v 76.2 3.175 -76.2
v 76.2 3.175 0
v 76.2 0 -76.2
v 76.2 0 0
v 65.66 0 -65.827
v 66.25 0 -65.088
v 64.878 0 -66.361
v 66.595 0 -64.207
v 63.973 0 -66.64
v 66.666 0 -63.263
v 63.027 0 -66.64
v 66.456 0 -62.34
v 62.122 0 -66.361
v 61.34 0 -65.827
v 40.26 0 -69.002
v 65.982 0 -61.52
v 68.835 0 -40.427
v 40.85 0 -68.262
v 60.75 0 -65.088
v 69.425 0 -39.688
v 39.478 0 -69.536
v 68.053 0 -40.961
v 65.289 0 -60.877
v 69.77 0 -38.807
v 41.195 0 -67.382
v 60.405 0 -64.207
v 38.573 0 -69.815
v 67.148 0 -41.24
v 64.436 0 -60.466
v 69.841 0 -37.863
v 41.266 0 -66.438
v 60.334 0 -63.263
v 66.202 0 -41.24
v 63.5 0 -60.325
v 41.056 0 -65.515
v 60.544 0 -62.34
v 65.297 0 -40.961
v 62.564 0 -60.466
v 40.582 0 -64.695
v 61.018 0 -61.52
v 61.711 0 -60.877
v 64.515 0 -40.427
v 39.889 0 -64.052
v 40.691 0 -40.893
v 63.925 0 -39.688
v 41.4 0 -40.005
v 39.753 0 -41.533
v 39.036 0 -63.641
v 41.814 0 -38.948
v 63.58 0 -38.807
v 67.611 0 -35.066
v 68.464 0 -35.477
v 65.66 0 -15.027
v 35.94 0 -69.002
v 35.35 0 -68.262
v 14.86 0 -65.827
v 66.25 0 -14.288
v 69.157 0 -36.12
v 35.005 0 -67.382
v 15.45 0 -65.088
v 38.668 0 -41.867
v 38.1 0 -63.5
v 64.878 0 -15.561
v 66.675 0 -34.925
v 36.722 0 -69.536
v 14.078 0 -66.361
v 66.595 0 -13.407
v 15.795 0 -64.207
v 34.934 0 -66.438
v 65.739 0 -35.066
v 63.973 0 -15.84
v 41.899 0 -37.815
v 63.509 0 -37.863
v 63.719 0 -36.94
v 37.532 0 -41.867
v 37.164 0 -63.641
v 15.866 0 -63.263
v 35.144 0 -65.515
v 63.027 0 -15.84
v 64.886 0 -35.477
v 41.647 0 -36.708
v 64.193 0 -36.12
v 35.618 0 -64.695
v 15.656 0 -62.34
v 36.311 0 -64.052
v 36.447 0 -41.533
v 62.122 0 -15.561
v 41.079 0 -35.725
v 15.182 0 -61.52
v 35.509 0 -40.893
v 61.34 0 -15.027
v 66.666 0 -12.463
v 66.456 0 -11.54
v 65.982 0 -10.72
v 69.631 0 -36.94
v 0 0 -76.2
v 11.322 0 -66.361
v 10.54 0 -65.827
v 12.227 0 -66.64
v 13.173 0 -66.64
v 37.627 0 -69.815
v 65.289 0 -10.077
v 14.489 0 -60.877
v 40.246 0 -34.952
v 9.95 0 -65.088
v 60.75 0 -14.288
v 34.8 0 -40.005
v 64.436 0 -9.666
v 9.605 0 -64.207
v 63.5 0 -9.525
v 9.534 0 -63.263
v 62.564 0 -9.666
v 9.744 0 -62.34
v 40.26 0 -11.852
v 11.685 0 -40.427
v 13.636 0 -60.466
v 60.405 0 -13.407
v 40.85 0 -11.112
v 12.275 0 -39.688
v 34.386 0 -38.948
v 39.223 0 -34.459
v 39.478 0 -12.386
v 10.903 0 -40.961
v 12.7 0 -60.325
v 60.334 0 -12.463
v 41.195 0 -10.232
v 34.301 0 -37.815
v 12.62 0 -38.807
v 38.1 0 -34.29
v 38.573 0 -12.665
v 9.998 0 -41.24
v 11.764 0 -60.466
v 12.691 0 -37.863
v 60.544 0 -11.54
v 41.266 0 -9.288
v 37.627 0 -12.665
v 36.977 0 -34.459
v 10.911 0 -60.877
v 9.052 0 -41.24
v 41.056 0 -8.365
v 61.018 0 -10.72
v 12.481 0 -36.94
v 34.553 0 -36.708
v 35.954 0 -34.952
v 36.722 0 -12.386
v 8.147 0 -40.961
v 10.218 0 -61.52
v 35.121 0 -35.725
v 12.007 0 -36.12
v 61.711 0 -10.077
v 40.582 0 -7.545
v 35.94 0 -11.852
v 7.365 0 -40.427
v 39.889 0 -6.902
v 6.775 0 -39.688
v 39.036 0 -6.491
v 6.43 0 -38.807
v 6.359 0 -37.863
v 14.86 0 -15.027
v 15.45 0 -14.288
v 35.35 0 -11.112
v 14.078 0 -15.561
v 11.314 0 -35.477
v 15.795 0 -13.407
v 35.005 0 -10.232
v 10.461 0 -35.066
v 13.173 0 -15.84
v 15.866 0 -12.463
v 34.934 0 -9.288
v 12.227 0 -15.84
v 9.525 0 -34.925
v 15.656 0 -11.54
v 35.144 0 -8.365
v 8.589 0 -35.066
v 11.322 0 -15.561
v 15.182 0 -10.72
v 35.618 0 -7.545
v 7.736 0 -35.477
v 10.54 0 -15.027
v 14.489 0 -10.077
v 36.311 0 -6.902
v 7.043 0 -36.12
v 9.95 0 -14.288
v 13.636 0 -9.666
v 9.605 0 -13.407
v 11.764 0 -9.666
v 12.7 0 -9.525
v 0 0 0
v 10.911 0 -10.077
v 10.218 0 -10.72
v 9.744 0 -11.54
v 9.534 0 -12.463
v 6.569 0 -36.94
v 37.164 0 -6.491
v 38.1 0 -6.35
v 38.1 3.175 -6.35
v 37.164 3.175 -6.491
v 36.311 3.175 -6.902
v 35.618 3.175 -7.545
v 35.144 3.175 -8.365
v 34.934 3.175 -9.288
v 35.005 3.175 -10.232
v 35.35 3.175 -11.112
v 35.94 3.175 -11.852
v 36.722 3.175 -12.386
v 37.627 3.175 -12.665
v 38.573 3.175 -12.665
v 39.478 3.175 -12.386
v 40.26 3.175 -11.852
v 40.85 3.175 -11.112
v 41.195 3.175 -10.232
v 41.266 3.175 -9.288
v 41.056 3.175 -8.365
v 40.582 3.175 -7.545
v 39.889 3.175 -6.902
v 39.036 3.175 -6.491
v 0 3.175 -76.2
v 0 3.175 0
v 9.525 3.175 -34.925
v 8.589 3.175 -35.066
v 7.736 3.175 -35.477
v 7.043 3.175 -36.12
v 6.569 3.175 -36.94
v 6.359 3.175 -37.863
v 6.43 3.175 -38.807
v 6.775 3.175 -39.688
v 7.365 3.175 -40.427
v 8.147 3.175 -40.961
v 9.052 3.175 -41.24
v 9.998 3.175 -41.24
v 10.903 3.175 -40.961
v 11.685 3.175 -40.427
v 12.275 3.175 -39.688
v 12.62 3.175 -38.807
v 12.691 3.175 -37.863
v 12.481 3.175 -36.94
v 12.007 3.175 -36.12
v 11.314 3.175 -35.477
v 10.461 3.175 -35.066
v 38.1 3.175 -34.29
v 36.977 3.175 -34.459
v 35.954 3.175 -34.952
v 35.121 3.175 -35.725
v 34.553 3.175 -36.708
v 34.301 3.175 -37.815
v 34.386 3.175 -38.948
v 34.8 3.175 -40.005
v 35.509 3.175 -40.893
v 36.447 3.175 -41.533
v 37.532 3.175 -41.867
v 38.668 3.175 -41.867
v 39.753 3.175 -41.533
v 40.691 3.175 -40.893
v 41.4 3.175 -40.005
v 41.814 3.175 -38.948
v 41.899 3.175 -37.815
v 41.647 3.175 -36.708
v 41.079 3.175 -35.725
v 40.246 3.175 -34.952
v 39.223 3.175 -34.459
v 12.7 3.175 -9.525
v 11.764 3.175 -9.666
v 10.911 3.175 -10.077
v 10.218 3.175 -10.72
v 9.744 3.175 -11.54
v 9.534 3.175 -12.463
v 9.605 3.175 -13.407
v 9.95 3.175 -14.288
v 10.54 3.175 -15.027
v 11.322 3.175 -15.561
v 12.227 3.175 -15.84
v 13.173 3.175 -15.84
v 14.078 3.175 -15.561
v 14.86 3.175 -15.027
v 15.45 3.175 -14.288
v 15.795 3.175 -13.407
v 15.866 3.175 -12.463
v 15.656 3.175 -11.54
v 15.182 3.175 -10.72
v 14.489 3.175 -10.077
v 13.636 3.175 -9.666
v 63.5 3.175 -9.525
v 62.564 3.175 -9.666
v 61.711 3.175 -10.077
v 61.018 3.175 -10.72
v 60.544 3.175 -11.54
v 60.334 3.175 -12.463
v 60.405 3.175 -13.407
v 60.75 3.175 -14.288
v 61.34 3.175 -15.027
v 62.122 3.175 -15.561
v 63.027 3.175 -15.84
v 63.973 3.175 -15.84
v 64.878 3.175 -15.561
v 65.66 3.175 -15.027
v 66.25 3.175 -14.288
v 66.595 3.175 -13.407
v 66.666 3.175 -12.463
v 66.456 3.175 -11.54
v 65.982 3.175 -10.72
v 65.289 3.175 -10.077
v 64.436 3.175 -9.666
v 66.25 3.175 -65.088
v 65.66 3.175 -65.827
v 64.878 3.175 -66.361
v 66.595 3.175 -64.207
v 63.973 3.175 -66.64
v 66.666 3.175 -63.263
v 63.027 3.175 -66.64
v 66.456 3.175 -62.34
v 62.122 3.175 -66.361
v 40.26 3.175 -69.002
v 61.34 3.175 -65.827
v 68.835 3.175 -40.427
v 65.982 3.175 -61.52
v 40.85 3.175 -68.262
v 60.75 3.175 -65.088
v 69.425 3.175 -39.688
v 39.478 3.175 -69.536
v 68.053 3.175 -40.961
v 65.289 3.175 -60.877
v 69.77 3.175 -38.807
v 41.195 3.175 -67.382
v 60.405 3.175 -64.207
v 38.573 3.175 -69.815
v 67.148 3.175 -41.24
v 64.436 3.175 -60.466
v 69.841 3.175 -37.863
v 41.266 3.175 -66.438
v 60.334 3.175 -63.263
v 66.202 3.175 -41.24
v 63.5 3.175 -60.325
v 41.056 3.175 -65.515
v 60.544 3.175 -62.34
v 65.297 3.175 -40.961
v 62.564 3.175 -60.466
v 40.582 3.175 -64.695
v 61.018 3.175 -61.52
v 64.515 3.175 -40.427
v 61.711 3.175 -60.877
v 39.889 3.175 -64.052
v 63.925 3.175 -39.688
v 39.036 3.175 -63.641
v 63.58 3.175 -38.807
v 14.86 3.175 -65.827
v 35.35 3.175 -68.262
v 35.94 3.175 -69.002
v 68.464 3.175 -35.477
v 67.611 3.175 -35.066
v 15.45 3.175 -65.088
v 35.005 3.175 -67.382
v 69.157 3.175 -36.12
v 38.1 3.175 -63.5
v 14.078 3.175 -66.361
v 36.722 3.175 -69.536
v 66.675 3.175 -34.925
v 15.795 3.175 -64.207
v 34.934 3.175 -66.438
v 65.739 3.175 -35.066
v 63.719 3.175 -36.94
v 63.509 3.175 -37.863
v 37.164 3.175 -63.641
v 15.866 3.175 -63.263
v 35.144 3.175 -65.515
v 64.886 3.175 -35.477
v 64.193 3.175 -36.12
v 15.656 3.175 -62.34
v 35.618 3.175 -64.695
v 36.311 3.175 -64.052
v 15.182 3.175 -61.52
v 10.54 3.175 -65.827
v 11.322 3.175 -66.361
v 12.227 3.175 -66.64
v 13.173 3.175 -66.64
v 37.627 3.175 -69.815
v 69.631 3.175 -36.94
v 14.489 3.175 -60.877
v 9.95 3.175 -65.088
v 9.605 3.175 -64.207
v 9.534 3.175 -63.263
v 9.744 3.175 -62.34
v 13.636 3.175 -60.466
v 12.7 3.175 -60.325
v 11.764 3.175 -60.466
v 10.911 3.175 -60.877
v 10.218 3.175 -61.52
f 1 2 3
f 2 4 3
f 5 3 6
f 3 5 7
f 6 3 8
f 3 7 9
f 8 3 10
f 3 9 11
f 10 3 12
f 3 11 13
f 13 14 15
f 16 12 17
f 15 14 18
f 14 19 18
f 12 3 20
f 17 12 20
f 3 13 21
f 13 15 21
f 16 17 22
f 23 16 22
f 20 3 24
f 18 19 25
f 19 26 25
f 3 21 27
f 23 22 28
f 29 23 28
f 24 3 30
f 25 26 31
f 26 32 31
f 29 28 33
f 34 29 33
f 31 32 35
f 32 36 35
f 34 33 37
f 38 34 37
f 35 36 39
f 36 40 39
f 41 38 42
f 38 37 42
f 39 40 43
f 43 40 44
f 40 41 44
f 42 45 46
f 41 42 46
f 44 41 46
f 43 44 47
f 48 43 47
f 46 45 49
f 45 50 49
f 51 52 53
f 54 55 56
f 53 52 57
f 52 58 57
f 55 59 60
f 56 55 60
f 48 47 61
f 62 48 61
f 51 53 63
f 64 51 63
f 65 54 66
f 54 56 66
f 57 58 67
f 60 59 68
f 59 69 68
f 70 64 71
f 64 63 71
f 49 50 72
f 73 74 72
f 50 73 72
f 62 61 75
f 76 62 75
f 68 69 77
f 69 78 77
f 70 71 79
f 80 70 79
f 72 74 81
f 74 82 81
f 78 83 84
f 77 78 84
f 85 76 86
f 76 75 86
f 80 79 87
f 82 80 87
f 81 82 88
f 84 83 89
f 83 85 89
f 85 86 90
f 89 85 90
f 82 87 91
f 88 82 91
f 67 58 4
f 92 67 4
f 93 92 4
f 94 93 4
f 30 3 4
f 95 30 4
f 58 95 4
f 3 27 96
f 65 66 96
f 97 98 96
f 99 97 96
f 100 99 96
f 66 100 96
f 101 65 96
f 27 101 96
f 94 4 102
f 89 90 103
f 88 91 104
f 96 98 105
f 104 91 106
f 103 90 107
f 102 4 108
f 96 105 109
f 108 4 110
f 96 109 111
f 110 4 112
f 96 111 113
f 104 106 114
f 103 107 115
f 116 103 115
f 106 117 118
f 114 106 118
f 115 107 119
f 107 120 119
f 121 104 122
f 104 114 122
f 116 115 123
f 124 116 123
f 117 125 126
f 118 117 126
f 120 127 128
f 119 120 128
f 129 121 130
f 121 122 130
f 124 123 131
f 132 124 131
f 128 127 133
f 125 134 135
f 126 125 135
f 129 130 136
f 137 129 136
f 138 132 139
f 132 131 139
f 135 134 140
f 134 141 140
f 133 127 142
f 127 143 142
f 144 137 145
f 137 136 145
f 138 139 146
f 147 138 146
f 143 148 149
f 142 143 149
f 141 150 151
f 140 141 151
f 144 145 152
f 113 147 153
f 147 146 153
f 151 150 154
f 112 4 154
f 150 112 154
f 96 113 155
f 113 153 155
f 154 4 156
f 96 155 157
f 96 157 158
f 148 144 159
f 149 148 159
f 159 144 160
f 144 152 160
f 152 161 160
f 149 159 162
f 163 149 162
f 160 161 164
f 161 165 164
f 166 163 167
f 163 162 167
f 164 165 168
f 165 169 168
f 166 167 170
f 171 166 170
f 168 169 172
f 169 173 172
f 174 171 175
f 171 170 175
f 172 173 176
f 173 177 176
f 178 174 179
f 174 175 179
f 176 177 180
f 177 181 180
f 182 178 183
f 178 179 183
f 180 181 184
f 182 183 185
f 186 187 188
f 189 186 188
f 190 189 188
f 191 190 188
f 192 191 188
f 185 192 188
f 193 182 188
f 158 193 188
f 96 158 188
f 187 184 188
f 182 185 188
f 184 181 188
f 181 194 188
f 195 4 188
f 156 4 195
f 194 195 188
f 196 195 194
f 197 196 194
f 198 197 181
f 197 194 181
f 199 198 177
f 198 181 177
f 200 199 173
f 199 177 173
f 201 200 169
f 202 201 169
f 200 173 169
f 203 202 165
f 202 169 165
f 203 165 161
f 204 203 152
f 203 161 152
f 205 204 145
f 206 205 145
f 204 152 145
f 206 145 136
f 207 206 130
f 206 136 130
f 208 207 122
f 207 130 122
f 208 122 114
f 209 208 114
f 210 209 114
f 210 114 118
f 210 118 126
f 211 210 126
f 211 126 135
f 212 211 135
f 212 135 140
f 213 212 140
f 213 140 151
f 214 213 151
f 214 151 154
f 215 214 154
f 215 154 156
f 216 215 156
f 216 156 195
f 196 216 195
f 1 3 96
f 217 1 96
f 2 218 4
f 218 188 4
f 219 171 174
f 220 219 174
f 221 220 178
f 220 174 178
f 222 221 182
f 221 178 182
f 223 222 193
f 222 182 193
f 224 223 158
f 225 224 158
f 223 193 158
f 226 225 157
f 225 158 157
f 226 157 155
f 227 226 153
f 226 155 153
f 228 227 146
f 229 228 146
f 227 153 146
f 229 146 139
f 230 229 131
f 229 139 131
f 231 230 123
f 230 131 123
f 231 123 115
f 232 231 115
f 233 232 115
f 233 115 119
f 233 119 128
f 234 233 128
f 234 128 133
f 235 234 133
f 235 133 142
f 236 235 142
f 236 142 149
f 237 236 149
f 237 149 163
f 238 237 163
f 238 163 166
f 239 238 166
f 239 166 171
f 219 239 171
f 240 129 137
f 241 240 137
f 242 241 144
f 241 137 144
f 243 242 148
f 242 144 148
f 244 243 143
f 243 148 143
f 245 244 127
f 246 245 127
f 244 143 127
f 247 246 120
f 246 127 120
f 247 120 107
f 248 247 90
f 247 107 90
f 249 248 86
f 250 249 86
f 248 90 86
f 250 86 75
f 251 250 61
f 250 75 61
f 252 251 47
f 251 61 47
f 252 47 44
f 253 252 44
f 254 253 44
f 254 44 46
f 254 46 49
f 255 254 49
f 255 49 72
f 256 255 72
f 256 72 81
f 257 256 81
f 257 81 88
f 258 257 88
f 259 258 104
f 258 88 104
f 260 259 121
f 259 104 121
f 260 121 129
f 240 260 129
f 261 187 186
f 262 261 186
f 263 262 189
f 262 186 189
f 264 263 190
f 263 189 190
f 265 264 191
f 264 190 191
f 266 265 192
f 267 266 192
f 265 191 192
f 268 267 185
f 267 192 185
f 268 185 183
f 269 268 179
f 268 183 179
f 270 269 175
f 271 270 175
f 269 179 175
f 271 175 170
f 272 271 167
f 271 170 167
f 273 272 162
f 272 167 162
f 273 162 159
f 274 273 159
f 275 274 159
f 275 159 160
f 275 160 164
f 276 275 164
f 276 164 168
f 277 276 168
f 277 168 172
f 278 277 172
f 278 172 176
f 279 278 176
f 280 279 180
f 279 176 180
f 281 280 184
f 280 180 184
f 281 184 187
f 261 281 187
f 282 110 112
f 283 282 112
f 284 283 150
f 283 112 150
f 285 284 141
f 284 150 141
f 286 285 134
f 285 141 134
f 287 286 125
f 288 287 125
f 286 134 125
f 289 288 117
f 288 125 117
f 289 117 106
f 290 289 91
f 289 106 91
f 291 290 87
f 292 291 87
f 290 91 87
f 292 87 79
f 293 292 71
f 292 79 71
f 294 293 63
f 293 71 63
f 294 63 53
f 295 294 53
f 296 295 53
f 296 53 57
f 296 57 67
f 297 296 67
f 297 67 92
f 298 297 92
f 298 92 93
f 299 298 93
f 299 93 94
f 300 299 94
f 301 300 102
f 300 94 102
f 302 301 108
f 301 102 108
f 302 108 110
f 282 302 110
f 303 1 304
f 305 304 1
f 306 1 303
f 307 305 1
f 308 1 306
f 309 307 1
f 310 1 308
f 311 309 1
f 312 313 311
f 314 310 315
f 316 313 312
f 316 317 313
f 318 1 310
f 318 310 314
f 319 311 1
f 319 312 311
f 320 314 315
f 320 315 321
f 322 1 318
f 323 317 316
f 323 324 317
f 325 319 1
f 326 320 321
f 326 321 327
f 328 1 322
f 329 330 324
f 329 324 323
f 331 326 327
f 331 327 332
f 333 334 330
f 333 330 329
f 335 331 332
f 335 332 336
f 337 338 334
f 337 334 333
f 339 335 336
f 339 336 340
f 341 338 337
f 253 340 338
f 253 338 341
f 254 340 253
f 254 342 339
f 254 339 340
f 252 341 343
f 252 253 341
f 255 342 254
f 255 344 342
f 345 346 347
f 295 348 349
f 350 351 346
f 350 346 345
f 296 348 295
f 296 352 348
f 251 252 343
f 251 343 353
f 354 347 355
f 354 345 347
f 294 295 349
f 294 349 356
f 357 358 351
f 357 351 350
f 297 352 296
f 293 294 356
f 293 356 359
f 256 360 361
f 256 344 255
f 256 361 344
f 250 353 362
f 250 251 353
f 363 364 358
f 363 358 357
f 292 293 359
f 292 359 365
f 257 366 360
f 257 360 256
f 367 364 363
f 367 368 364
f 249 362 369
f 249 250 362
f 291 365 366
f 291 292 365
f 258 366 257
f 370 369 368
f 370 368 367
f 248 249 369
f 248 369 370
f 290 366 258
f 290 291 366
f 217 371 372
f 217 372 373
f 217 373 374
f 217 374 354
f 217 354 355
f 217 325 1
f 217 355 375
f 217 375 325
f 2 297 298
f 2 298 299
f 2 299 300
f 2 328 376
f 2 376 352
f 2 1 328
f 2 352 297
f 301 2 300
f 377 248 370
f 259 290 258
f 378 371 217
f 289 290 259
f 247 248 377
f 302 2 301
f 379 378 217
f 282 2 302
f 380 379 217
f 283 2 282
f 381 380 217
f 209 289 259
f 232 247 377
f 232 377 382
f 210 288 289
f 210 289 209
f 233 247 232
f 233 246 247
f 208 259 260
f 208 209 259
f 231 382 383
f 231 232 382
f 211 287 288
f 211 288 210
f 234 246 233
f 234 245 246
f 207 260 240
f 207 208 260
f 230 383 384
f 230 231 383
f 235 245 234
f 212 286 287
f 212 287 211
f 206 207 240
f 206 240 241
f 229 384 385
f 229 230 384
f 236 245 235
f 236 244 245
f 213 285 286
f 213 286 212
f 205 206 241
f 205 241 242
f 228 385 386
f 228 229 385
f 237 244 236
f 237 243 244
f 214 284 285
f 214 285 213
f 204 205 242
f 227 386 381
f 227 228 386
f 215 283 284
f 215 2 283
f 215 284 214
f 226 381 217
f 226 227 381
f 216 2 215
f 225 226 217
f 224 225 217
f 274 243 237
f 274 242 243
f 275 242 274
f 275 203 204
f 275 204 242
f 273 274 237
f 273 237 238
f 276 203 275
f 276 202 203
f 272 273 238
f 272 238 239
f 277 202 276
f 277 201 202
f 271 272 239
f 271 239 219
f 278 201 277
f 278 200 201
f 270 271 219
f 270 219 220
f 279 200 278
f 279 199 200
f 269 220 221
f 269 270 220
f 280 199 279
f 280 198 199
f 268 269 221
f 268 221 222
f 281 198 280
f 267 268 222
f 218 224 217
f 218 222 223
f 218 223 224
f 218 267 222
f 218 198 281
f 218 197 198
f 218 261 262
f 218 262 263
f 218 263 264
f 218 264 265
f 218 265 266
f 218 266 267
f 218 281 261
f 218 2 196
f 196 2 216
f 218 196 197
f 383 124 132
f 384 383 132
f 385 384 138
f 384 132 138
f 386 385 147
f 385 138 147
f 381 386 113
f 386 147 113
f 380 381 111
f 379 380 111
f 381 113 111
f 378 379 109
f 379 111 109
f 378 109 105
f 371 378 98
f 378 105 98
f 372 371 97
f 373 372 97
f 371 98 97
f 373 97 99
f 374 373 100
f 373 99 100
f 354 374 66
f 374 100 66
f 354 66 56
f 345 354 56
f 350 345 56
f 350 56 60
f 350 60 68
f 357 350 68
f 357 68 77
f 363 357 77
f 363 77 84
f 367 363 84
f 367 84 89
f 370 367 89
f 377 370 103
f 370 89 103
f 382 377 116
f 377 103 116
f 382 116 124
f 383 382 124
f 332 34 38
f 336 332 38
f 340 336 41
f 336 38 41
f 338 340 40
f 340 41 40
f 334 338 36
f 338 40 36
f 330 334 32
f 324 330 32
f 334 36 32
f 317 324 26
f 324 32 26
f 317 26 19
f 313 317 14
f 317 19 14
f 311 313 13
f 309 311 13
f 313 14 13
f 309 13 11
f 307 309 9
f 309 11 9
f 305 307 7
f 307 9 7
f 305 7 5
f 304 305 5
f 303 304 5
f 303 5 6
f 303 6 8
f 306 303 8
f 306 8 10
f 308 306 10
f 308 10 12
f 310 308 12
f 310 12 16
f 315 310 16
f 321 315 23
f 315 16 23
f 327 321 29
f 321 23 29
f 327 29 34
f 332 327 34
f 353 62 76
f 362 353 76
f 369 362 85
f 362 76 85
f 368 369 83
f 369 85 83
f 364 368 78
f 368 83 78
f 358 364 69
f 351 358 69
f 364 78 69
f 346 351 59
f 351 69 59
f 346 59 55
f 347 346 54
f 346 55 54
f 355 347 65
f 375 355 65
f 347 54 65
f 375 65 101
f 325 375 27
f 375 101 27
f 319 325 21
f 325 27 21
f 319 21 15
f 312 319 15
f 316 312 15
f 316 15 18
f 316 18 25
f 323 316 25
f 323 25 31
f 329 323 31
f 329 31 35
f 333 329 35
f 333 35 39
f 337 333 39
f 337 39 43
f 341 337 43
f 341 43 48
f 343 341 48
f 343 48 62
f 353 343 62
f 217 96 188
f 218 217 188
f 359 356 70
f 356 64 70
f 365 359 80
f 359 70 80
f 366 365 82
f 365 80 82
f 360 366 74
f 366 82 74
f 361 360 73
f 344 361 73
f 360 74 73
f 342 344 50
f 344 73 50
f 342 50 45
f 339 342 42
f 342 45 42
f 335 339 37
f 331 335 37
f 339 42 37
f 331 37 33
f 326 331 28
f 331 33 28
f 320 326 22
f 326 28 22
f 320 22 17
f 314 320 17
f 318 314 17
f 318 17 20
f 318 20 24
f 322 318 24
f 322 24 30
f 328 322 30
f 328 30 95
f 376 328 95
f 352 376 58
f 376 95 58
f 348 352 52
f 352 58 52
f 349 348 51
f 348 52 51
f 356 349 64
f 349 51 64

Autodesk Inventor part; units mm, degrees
ref_plane "YZ Plane" through (0, 0, 0) normal (1, 0, 0) x (0, 1, 0)
ref_plane "XZ Plane" through (0, 0, 0) normal (0, 1, 0) x (-1, 0, 0)
ref_plane "XY Plane" through (0, 0, 0) normal (0, 0, 1) x (1, 0, 0)
sketch "Sketch1" plane through (0, 0, 0) normal (0, 1, 0) x (-1, 0, 0)
  line L0 (0, 0) -> (-76.2, 0)
  line L1 (-76.2, 0) -> (-76.2, -76.2)
  line L2 (-76.2, -76.2) -> (0, -76.2)
  line L3 (0, -76.2) -> (0, 0)
  dimension "d0" = 76.2
  dimension "d1" = 76.2
extrude "Extrusion1" add sketch "Sketch1" along normal blind 3.175
sketch "Sketch2" plane through (0, 3.175, 0) normal (0, 1, 0) x (1, 0, 0)
  line L0 (76.2, 76.2) -> (0, 76.2) projected
  line L1 (0, 76.2) -> (0, 0) projected
  line L2 (9.525, 38.1) -> (38.1, 66.675)
  line L3 (38.1, 66.675) -> (66.675, 38.1)
  line L4 (66.675, 38.1) -> (38.1, 9.525)
  line L5 (38.1, 9.525) -> (9.525, 38.1)
  line L6 (0, 0) -> (76.2, 0) projected
  dimension "d5" = 57.15
  dimension "d7" = 57.15
  dimension "d8" = 9.525
  dimension "d9" = 9.525
  dimension "d29" = 45
hole "Hole1" at (38.1, 3.175, -66.675) at (9.525, 3.175, -38.1) at (38.1, 3.175, -9.525) at (66.675, 3.175, -38.1) direction (0, -1, 0) diameter 6.35 end through all
sketch "Sketch3" plane through (0, 3.175, 0) normal (0, 1, 0) x (1, 0, 0)
  line L0 (76.2, 0) -> (76.2, 76.2) projected
  line L1 (76.2, 76.2) -> (0, 76.2) projected
  line L2 (12.7, 63.5) -> (63.5, 63.5)
  line L3 (63.5, 63.5) -> (63.5, 12.7)
  line L4 (63.5, 12.7) -> (12.7, 12.7)
  line L5 (12.7, 12.7) -> (12.7, 63.5)
  dimension "d17" = 50.8
  dimension "d19" = 50.8
  dimension "d20" = 12.7
  dimension "d21" = 12.7
hole "Hole2" at (12.7, 3.175, -63.5) at (63.5, 3.175, -63.5) at (12.7, 3.175, -12.7) at (63.5, 3.175, -12.7) direction (0, -1, 0) diameter 6.35 end through all
sketch "Sketch4" plane through (0, 3.175, 0) normal (0, 1, 0) x (1, 0, 0)
  line L0 (0, 0) -> (76.2, 0) projected
  line L1 (76.2, 0) -> (76.2, 76.2) projected
  point P0 (38.1, 38.1)
  dimension "d34" = 38.1
  dimension "d35" = 38.1
hole "Hole3" at (38.1, 3.175, -38.1) direction (0, -1, 0) diameter 7.62 end through all
properties part number "CouplerBridge"
